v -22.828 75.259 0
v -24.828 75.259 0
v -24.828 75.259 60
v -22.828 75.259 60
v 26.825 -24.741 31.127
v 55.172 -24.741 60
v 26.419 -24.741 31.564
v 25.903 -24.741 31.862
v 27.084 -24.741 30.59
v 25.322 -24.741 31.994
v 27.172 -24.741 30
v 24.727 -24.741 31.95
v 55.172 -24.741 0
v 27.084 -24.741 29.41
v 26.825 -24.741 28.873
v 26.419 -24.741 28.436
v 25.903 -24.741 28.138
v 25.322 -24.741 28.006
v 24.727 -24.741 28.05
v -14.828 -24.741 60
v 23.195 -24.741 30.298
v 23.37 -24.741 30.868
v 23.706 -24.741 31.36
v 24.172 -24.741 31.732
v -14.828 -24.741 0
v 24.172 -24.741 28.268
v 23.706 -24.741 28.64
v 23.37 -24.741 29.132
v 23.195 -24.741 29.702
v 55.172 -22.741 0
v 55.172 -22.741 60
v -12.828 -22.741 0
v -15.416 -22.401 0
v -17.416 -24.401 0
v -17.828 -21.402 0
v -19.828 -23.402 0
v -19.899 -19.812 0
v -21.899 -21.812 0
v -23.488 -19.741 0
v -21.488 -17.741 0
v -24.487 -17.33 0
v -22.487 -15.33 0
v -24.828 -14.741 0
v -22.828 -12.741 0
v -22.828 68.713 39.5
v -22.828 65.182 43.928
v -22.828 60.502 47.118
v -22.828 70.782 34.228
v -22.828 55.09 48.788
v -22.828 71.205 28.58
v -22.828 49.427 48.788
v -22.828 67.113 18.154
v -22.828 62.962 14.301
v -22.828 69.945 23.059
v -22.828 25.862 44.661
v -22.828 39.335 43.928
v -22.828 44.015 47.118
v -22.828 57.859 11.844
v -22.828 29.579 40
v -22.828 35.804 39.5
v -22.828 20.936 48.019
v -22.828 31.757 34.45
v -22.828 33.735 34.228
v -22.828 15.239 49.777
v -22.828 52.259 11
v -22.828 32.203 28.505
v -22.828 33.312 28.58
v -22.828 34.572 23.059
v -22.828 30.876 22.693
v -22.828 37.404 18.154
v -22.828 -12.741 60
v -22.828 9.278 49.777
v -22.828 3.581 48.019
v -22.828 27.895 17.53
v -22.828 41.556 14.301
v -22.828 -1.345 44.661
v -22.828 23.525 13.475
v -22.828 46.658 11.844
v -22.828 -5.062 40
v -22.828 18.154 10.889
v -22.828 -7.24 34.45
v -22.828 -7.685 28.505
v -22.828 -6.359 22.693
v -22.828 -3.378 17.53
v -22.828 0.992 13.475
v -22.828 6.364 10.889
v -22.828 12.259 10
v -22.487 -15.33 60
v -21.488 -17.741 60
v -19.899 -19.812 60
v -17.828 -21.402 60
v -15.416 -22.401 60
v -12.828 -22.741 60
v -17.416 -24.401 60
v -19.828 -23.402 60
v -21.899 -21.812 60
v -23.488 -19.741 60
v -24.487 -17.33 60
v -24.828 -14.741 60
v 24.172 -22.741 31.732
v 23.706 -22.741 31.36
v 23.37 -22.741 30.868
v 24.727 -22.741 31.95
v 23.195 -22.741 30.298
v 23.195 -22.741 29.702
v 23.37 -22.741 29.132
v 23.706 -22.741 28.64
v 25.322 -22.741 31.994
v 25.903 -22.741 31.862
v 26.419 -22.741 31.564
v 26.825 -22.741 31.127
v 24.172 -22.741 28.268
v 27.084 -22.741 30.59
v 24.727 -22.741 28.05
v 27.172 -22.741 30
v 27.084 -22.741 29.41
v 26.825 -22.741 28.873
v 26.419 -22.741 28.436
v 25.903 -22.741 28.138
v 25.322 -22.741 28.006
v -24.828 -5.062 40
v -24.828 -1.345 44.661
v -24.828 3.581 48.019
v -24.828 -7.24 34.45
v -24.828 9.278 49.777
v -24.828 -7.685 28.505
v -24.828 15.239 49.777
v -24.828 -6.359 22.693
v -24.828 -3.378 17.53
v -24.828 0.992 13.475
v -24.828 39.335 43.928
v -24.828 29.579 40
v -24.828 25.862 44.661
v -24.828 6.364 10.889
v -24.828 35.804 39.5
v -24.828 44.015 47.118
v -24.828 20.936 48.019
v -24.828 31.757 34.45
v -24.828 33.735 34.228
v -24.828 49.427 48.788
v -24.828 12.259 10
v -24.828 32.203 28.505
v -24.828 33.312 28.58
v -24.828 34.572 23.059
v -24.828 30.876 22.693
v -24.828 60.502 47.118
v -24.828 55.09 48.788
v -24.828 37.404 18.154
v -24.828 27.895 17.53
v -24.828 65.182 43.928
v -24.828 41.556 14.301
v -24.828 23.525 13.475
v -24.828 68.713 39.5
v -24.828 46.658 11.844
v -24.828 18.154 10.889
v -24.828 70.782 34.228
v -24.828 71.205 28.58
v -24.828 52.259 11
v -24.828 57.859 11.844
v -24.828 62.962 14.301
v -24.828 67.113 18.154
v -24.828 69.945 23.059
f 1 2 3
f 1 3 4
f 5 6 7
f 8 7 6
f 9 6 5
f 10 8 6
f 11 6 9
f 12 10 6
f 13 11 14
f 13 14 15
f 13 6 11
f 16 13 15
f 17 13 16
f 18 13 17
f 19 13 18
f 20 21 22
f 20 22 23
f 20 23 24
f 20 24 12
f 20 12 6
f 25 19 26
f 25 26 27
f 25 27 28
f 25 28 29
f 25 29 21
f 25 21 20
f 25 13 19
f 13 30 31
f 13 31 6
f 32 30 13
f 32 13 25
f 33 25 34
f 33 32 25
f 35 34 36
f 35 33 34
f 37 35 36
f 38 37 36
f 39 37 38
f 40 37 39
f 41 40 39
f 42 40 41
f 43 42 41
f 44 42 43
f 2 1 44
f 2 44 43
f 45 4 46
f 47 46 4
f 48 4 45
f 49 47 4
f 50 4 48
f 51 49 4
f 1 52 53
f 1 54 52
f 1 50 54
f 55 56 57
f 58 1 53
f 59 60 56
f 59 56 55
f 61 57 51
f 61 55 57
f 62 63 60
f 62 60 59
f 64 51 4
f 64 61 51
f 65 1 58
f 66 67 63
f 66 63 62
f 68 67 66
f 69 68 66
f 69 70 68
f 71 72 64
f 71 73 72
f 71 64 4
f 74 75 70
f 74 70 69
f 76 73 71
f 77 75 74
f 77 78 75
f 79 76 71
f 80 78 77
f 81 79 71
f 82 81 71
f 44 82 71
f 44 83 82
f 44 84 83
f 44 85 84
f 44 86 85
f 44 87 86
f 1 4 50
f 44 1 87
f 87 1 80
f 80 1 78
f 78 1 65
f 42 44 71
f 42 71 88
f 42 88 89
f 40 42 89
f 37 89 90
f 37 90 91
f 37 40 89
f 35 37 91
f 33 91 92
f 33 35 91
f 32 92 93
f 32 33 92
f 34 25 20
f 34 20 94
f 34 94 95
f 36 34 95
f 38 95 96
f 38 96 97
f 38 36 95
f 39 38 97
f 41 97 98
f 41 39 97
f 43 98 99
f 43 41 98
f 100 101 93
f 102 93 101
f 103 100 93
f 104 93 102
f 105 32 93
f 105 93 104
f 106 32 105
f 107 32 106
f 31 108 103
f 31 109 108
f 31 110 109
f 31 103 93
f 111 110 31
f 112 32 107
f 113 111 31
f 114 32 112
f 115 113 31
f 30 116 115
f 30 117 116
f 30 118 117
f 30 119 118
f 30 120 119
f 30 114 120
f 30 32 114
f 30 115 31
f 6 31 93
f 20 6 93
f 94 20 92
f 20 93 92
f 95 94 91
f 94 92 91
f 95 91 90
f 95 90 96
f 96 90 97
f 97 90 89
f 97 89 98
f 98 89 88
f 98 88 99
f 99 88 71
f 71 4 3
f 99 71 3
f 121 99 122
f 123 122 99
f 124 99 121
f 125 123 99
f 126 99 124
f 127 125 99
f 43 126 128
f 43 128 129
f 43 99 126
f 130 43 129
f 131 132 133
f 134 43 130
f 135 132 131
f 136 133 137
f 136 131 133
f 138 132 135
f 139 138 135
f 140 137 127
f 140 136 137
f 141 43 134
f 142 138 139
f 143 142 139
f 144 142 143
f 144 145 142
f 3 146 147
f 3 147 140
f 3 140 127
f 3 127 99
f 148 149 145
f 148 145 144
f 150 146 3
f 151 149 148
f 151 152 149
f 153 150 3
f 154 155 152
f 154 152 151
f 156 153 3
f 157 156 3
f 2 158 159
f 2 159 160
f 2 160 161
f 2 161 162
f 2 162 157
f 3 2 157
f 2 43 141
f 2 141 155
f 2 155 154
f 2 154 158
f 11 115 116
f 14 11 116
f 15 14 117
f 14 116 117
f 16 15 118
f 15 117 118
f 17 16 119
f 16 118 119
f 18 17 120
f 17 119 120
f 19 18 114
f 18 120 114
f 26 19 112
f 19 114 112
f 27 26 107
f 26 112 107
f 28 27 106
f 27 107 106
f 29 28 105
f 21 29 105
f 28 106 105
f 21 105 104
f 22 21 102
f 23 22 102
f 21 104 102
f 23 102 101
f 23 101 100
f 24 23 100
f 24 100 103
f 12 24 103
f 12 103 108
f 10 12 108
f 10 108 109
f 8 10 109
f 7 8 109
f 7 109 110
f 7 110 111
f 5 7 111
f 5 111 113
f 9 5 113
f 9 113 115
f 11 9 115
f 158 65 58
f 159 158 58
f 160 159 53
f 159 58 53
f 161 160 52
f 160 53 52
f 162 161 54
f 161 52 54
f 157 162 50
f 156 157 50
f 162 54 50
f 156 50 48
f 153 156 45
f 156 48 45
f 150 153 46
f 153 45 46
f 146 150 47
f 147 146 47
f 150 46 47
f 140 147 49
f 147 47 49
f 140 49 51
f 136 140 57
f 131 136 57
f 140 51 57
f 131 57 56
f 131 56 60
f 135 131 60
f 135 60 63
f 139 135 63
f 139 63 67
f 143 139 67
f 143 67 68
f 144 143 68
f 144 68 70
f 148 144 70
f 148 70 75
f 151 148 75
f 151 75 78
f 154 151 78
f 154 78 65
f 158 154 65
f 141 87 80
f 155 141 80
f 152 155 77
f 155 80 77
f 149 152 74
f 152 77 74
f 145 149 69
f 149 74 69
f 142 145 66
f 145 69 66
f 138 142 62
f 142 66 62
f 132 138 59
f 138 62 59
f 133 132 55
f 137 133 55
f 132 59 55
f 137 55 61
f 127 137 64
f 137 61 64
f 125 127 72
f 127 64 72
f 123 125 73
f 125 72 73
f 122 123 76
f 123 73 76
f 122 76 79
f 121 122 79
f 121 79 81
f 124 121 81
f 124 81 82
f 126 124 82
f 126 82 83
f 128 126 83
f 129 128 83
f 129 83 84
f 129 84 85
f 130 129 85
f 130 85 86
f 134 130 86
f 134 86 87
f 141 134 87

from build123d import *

# Parameters (mm, degrees)
BOSS_EXTRUDE1_DEPTH = 60
SKETCH2_R           = 20
SKETCH2_R_2         = 19
CUT_EXTRUDE1_DEPTH  = 10
SKETCH3_R           = 2
CUT_EXTRUDE2_DEPTH  = 10


with BuildPart() as part:
    # Sketch1 → Boss-Extrude1 (new body)
    with BuildSketch(Plane.XY):
        with BuildLine():
            Line((-24.827586207, 75.25862069), (-22.827586207, 75.25862069))
            Line((-22.827586207, 75.25862069), (-22.827586207, -12.74137931))
            ThreePointArc((-22.827586207, -12.74137931), (-19.898654019, -19.812447122), (-12.827586207, -22.74137931))
            Line((-12.827586207, -22.74137931), (55.172413793, -22.74137931))
            Line((55.172413793, -22.74137931), (55.172413793, -24.74137931))
            Line((55.172413793, -24.74137931), (-14.827586207, -24.74137931))
            ThreePointArc((-14.827586207, -24.74137931), (-21.898654019, -21.812447122), (-24.827586207, -14.74137931))
            Line((-24.827586207, -14.74137931), (-24.827586207, 75.25862069))
        make_face()
    extrude(amount=BOSS_EXTRUDE1_DEPTH)

    # Sketch2 → Cut-Extrude1 (cut)
    with BuildSketch(Plane(origin=(-22.827586207, 0, 0), x_dir=(0, 0, -1), z_dir=(1, 0, 0))):
        with Locations((-30, 12.25862069)):
            Circle(SKETCH2_R)
        with Locations((-30, 52.25862069)):
            Circle(SKETCH2_R_2)
    extrude(amount=-CUT_EXTRUDE1_DEPTH, mode=Mode.SUBTRACT)

    # Sketch3 → Cut-Extrude2 (cut)
    with BuildSketch(Plane(origin=(0, -22.74137931, 0), x_dir=(1, 0, 0), z_dir=(0, 1, 0))):
        with Locations((25.172413793, -30)):
            Circle(SKETCH3_R)
    extrude(amount=-CUT_EXTRUDE2_DEPTH, mode=Mode.SUBTRACT)


solid = part.part
